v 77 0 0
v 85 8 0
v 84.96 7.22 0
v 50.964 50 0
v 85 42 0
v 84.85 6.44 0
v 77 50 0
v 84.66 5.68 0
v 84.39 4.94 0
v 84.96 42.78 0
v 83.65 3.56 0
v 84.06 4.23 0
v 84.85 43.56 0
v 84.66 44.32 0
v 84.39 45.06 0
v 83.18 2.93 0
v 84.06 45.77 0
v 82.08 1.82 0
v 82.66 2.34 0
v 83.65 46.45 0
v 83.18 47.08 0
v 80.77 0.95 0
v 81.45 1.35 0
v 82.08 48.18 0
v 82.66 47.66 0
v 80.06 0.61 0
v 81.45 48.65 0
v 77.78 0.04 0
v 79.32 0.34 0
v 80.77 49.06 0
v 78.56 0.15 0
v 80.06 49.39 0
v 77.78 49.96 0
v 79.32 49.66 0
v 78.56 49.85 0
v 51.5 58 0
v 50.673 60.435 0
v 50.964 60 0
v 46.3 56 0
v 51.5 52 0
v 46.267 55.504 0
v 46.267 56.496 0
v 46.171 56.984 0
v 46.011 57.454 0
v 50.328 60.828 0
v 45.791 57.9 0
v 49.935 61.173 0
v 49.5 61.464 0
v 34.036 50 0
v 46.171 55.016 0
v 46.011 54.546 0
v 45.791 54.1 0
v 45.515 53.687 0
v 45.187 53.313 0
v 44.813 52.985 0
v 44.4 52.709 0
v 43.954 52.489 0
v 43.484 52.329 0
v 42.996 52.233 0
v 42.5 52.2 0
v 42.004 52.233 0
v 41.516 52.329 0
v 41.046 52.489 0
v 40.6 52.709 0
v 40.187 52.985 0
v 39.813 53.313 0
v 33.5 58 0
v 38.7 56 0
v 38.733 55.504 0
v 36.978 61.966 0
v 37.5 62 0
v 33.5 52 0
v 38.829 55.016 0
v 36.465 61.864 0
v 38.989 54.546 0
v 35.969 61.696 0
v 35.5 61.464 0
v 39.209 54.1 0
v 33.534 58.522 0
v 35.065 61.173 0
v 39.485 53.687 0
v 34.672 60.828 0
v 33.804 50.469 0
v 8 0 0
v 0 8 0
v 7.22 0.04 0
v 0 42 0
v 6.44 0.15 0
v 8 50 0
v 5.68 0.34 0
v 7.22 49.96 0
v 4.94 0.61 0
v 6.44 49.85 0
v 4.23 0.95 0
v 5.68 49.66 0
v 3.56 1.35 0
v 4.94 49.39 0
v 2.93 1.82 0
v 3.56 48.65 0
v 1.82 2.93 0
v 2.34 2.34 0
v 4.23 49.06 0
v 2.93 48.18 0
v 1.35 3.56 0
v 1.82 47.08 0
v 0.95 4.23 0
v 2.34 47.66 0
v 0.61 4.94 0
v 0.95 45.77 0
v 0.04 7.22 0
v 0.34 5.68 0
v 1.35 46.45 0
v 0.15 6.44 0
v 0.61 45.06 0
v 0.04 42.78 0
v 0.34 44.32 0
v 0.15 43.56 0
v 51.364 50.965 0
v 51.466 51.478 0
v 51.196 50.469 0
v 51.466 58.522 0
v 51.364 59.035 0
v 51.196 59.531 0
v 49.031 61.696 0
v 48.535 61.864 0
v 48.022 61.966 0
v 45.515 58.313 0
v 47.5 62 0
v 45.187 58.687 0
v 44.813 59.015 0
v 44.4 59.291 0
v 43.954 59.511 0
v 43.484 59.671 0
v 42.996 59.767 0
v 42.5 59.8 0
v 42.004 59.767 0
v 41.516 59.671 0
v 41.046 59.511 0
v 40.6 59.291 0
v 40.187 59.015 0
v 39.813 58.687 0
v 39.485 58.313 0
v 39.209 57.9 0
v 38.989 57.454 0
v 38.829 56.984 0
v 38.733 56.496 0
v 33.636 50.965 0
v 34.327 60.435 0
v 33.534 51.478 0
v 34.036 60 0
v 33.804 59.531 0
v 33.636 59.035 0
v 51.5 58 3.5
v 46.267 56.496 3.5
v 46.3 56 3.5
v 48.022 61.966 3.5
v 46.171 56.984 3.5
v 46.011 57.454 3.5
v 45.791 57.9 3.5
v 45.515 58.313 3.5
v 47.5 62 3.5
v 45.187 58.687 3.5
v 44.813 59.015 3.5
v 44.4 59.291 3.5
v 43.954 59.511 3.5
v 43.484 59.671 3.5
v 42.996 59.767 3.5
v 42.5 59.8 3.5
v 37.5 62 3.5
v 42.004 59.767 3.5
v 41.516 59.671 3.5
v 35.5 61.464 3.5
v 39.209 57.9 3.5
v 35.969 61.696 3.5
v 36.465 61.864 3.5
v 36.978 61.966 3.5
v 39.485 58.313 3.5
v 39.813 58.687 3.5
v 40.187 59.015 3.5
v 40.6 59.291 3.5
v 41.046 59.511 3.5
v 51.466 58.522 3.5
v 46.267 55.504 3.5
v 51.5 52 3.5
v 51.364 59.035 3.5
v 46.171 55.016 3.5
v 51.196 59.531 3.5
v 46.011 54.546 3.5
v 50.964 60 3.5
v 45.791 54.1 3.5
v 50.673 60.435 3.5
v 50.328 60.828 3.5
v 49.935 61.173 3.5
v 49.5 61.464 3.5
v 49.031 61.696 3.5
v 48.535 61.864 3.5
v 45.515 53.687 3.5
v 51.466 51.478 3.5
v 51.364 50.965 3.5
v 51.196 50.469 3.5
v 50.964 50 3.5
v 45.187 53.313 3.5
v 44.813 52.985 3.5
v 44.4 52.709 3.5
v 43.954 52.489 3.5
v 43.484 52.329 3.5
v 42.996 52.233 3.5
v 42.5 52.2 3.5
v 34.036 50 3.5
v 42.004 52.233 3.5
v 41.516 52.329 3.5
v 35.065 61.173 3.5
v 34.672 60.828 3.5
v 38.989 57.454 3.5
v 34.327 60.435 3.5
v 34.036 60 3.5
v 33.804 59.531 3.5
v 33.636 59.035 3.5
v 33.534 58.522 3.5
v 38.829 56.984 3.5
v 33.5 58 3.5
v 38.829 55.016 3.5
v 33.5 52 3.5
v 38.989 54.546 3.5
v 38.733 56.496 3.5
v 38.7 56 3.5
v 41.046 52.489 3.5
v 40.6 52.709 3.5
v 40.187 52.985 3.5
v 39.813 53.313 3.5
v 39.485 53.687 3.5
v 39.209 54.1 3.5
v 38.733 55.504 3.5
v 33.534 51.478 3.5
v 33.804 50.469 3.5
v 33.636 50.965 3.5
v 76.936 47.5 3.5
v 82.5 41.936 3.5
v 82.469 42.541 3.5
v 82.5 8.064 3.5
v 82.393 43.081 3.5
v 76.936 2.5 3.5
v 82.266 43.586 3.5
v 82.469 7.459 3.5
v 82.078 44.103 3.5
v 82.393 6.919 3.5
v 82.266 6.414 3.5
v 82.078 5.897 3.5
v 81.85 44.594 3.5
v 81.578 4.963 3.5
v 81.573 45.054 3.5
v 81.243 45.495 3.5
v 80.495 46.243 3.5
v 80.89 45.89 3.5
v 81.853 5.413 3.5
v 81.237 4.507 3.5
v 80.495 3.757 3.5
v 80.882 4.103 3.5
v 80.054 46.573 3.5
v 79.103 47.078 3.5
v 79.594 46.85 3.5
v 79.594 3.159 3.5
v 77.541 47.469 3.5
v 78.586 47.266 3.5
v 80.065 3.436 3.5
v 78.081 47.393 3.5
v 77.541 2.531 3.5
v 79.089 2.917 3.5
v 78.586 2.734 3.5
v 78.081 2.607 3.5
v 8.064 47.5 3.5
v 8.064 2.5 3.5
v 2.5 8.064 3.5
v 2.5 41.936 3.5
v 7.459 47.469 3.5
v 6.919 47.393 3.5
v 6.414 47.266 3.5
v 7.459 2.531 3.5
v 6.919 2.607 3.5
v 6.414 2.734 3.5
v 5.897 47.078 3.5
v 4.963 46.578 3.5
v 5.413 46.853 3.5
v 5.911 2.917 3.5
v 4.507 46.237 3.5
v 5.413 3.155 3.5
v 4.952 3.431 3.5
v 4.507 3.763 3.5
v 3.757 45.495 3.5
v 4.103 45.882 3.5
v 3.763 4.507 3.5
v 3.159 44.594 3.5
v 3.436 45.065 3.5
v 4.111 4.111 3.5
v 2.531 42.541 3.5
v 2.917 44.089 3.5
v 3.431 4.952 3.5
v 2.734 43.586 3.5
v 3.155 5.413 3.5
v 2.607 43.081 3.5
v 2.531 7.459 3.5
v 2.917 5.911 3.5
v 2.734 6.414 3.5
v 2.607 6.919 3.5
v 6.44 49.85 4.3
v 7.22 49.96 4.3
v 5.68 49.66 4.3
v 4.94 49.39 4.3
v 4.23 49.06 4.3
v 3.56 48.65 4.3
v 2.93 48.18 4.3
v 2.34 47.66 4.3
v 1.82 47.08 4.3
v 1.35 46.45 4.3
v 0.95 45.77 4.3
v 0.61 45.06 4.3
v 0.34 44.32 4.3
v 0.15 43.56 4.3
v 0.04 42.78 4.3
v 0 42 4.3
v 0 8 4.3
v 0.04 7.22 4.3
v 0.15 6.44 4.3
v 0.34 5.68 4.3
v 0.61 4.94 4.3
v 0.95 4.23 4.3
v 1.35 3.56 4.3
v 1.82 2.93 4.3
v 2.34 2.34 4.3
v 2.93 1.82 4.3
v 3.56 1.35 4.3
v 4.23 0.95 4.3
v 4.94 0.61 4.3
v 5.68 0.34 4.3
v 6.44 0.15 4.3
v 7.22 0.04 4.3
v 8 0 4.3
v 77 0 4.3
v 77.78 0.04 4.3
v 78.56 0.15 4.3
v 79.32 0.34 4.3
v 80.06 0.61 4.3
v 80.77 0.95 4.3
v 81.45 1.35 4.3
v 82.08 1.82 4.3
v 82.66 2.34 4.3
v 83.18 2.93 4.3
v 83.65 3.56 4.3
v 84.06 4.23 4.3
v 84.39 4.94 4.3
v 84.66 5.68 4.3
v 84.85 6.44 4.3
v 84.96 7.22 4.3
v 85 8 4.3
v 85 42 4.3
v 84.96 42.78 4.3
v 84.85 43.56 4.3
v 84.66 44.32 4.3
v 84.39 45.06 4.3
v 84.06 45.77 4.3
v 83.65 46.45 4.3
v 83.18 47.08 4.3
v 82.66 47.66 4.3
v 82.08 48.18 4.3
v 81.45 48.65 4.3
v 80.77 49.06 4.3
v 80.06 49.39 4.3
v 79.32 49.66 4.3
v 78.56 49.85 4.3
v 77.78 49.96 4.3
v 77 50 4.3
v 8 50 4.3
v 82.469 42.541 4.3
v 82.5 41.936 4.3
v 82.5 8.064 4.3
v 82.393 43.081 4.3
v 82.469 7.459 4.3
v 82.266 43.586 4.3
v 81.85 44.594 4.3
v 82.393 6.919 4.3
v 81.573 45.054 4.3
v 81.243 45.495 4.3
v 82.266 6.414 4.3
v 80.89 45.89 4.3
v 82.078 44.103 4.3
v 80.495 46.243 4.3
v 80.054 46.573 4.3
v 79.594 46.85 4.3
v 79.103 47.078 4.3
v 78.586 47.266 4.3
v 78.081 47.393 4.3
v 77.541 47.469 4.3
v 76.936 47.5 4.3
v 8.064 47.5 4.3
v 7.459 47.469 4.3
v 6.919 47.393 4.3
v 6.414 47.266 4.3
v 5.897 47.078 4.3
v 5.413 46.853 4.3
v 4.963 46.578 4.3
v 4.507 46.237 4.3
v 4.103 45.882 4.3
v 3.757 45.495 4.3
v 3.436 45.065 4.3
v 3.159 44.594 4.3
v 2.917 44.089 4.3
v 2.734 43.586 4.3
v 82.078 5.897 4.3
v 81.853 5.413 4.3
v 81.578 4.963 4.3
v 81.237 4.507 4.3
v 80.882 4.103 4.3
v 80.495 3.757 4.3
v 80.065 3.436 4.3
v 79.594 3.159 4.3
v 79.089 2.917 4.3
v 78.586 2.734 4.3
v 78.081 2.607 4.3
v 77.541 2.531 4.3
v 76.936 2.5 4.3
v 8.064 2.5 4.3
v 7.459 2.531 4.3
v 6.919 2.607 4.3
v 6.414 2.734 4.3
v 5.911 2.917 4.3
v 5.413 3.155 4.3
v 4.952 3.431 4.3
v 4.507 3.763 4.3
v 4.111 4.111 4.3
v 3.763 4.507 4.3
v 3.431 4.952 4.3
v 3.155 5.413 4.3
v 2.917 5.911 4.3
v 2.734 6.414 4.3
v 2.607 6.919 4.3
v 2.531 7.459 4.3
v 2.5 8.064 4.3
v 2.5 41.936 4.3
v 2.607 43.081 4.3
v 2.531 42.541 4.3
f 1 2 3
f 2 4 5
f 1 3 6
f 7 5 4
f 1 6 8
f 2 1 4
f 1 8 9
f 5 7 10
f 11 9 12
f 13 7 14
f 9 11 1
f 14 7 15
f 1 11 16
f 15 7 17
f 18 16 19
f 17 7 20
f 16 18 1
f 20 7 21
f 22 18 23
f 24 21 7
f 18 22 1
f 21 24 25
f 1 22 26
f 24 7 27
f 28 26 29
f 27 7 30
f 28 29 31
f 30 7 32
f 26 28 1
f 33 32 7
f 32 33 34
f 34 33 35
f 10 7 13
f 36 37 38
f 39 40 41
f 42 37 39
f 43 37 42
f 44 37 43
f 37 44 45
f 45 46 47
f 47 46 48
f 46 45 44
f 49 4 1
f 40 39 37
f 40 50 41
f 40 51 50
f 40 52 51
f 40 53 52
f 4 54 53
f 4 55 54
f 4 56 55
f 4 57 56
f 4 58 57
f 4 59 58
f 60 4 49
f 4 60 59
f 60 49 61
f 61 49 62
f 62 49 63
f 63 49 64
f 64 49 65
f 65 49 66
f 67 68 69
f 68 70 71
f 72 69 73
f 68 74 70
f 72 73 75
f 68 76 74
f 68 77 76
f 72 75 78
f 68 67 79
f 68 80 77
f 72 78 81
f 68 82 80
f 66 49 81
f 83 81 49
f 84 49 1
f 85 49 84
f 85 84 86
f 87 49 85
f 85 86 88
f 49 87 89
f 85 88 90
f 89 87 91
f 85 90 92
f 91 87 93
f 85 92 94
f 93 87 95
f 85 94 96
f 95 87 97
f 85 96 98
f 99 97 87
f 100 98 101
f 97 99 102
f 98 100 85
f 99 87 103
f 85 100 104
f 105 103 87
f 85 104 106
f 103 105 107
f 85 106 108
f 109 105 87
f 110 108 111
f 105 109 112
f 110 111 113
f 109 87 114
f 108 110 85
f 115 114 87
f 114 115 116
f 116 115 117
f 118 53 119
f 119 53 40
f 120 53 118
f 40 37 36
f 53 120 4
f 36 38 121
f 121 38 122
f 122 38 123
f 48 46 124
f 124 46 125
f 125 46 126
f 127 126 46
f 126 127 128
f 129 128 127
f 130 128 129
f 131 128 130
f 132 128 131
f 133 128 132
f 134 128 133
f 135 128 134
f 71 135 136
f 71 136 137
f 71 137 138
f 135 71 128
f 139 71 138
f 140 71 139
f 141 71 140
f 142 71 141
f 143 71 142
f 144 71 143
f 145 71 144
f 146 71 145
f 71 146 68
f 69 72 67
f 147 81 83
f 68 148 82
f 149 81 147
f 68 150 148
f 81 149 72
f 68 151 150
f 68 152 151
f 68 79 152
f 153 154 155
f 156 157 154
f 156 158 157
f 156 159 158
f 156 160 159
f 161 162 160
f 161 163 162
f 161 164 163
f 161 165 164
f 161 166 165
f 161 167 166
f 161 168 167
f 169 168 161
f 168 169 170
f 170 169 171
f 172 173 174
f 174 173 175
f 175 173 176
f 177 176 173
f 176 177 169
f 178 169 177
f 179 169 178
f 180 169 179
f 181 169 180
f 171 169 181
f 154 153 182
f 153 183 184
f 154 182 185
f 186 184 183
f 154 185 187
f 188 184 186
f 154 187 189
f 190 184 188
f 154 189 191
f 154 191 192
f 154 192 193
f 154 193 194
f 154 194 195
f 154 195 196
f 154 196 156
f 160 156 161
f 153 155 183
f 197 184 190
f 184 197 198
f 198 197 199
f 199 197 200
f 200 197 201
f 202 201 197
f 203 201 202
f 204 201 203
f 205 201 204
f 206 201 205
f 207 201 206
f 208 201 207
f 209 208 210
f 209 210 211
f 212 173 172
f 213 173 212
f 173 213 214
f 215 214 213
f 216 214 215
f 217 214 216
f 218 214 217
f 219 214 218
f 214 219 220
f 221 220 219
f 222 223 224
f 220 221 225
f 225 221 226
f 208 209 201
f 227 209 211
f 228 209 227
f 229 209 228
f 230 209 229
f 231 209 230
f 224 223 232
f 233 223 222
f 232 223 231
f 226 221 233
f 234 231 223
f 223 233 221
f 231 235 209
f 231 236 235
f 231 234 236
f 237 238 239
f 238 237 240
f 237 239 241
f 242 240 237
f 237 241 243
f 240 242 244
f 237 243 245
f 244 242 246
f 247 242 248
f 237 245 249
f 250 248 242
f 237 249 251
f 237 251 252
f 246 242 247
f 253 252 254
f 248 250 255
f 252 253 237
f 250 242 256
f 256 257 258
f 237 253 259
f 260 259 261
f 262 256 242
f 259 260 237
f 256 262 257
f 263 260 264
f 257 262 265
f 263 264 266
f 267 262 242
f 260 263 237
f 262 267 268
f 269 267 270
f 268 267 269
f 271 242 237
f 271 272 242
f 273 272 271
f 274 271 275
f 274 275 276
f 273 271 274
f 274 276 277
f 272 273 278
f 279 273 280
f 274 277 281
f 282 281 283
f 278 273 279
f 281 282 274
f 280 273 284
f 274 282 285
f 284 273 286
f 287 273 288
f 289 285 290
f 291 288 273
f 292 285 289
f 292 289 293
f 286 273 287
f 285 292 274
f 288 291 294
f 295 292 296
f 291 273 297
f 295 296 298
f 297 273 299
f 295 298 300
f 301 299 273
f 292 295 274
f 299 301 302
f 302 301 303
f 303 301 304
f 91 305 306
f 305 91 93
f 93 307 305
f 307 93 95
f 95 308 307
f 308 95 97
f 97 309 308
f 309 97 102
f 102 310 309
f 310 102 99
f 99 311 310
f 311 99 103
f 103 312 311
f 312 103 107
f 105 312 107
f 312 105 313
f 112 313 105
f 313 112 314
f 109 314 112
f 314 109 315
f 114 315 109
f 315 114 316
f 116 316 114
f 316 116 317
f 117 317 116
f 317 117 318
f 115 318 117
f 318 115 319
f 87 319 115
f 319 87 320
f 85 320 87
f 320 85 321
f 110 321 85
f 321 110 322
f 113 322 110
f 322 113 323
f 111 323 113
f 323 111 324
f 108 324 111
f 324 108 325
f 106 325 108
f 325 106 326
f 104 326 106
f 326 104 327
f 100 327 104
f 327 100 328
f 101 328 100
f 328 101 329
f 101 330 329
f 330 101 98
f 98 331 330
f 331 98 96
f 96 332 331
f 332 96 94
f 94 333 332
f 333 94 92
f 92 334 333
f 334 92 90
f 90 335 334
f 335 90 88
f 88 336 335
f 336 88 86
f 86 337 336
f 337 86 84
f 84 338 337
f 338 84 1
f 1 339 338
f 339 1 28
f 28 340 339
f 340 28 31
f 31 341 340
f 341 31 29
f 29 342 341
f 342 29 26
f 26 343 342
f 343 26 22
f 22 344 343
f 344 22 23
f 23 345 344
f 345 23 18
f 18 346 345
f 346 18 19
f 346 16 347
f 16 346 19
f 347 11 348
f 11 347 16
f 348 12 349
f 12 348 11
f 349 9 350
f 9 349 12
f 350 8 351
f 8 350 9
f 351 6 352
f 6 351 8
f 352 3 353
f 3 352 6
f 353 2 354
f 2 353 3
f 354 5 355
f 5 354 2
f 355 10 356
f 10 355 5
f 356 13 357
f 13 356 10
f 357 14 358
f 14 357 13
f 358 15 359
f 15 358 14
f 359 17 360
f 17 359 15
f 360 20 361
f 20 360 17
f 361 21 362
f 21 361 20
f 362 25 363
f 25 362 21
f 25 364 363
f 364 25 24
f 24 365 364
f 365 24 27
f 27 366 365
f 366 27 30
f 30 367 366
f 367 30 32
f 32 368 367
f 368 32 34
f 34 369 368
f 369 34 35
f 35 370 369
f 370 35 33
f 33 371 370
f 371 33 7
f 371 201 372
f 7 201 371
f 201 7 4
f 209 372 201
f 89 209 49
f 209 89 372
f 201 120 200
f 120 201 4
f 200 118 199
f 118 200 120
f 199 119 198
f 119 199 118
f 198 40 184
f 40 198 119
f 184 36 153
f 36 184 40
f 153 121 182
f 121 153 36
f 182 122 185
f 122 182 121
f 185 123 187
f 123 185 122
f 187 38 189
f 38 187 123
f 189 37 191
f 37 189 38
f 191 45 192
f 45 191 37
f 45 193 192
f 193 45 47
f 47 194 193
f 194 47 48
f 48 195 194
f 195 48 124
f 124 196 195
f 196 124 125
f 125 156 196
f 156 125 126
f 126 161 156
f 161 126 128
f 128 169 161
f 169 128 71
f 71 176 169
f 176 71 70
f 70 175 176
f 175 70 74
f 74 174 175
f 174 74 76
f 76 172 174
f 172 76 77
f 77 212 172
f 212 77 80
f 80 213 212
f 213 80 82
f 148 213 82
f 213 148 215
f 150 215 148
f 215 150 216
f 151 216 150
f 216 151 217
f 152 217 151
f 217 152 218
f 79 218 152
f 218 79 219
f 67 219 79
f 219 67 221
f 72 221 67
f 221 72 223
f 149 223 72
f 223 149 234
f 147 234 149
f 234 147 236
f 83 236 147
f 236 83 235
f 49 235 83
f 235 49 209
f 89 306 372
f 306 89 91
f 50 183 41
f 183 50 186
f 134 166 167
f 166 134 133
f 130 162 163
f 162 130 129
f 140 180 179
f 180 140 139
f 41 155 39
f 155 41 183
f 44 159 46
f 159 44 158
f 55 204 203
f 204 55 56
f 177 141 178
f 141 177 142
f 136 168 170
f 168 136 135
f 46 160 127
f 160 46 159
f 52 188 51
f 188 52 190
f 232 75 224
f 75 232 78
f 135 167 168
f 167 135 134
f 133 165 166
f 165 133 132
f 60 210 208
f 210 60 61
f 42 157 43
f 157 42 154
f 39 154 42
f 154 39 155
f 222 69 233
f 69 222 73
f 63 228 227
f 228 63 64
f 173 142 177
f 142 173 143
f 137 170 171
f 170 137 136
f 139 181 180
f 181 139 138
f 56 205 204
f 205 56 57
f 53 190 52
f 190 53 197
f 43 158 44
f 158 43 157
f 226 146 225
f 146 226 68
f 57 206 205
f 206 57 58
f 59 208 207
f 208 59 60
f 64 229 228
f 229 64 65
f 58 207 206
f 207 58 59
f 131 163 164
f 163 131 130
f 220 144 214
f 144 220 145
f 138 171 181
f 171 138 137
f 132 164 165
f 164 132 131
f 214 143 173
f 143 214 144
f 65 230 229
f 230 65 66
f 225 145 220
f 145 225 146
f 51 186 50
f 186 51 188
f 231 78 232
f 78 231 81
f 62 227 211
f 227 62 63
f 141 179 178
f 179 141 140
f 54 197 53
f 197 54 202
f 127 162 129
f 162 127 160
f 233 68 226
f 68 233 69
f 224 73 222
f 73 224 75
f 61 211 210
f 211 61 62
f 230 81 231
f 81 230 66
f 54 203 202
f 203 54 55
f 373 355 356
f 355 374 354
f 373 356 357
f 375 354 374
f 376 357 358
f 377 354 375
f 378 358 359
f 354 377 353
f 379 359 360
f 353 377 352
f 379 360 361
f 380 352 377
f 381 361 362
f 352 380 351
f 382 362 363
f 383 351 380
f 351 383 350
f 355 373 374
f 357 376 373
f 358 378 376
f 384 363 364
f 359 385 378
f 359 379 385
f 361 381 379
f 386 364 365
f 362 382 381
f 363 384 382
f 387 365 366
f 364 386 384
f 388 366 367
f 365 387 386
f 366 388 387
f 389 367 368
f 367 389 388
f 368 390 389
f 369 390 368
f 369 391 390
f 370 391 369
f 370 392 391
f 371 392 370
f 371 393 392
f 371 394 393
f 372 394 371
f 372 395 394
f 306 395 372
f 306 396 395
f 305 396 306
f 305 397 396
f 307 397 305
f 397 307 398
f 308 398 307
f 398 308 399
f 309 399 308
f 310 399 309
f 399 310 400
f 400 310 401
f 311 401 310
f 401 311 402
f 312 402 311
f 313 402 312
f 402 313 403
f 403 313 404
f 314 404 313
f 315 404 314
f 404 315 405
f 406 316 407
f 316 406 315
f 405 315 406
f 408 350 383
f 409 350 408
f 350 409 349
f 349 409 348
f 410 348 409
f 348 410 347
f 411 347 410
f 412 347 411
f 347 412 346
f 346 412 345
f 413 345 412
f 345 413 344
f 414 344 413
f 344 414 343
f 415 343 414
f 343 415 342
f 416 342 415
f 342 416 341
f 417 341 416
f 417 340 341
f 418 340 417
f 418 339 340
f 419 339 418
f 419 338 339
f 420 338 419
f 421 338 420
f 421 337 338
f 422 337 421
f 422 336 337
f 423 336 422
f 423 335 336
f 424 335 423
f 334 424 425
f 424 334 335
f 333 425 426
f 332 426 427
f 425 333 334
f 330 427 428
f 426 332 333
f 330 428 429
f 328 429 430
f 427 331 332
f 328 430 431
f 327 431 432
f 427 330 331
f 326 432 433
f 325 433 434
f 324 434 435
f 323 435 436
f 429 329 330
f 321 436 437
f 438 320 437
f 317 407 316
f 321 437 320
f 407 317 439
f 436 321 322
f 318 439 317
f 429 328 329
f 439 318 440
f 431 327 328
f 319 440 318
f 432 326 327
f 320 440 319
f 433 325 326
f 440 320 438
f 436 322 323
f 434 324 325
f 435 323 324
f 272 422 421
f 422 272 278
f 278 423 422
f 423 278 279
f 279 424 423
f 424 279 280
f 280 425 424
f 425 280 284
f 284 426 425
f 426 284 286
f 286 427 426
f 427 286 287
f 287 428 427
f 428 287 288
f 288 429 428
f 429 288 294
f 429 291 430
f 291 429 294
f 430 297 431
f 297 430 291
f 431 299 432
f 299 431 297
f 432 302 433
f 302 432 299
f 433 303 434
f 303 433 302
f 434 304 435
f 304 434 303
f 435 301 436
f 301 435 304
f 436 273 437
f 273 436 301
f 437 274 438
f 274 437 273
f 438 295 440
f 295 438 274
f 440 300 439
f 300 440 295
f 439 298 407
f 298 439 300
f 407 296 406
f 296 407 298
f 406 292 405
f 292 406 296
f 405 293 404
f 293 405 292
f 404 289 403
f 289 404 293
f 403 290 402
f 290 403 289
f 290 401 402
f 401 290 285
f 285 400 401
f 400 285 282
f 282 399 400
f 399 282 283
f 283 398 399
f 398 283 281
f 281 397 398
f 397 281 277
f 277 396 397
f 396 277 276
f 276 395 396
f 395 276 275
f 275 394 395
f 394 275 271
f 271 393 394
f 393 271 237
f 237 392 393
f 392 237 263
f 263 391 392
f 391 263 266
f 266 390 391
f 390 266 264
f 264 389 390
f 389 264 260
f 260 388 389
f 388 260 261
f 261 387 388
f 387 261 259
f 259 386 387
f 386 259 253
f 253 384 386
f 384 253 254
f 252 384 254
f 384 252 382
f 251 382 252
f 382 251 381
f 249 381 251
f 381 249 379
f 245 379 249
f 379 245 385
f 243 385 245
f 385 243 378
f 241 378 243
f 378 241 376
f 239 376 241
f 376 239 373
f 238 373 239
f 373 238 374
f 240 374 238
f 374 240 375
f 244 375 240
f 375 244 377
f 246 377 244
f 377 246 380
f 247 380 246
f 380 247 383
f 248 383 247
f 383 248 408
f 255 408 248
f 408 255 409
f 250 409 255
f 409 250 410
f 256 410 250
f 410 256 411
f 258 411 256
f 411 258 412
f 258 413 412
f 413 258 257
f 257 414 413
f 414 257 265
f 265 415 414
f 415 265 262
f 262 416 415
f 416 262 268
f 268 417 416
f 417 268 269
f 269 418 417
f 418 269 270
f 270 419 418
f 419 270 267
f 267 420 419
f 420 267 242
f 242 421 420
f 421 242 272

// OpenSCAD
// ── ETIQUETA PARA MOCHILA / SACO DE DESPORTO ──
// Parâmetros injectados pelo backend:
//   nome, linha2, verso   texto da frente (1–2 linhas) e do verso (escavado)
//   fonte                 família da fonte (instalada no servidor, ver /fonts)
//   fontSize              tamanho do texto em mm (size do OpenSCAD)
//   largura_pct, altura_pct  largura / altura da placa em % da forma (50–200, omissão 100)
//   esc_nome, esc_linha2, esc_verso
//                         factor 0–1 de redução do texto, calculado pelo servidor
//                         (lib/textFit.js) para caber na largura útil; 1 = sem redução
//   cor_base, cor_borda, cor_texto
//                         cores (#RRGGBB) de cada parte; só usadas no modo "tudo"
//                         (no 3MF a cor vai em cada objeto, ver generation_schema.multicor)
//   modo                  que parte gerar: "base" (placa + aba, com o verso escavado),
//                         "borda", "texto" ou "tudo" (omissão; "preview" = "tudo").
//                         O backend gera cada parte num STL e junta-as num 3MF multicor.
//                         As partes tocam-se sem se sobreporem, para o slicer as aceitar
//                         como peças do mesmo objeto.
//
// Não há valores por defeito como `nome = ...;` e também não se derivam variáveis de
// topo a partir das injectadas (`_nome = is_undef(nome) ? "" : nome;` seria calculada
// antes de o servidor definir `nome` quando as variáveis vêm DEPOIS do template, e sairia
// vazia — a etiqueta ficava sem texto).
// As injectadas são lidas por funções, avaliadas só na instanciação, quando já têm o
// valor final — por isso a ordem de injecção (antes ou depois do template) é indiferente.

function _nome()      = is_undef(nome)      ? ""          : nome;
function _linha2()    = is_undef(linha2)    ? ""          : linha2;
function _verso()     = is_undef(verso)     ? ""          : verso;
function _fonte()     = is_undef(fonte)     ? "Open Sans" : fonte;
function _fs()        = is_undef(fontSize)  ? 9           : fontSize;
function _esc_nome()   = is_undef(esc_nome)   ? 1 : esc_nome;
function _esc_linha2() = is_undef(esc_linha2) ? 1 : esc_linha2;
function _esc_verso()  = is_undef(esc_verso)  ? 1 : esc_verso;
function _modo()      = is_undef(modo) ? "tudo" : modo;
function _cor(c, d)   = (is_string(c) && len(c) == 7) ? c : d;
function _cor_base()  = is_undef(cor_base)  ? "#1E3A8A" : _cor(cor_base,  "#1E3A8A");
function _cor_borda() = is_undef(cor_borda) ? "#FFFFFF" : _cor(cor_borda, "#FFFFFF");
function _cor_texto() = is_undef(cor_texto) ? "#FFFFFF" : _cor(cor_texto, "#FFFFFF");
// Peças separadas (base/borda/texto) assentam em z = esp; em "tudo" sobrepõem-se 0,01 mm
// para o OpenSCAD as fundir num só sólido.
function _sob()       = (_modo() == "base" || _modo() == "borda" || _modo() == "texto") ? 0 : 0.01;

esp     = 3.5;
r_furo  = 3.8;

// Borda e texto
borda_larg = 2.5;
borda_esp  = 0.8;
alt_texto  = 1.2;   // relevo da frente
prof_verso = 1.3;   // profundidade do verso escavado

// FORMAS: contornos pré-calculados (scripts/gerar_formas.mjs); a pré-visualização do
// browser usa os mesmos pontos. A largura útil do texto de cada forma está em
// generation_schema.ajuste_texto.largura_por_forma (usada pelo servidor e pelo browser).
// @@FORMAS-BEGIN (gerado por scripts/gerar_formas.mjs — não editar à mão)
// [nome, cx, cy, topo_em_cx, largura_base, altura_base, aba_w, aba_r, aba_recuo, furo_acima_topo, aba_acima_furo, contorno]
// (largura_pct/altura_pct escalam x e y; a borda é calculada no OpenSCAD com offset)
FORMAS = [
  ["Retangular", 42.5, 25, 50, 85, 50, 18, 4, 2, 6, 6,
   [[77.78,0.04],[78.56,0.15],[79.32,0.34],[80.06,0.61],[80.77,0.95],[81.45,1.35],[82.08,1.82],[82.66,2.34],[83.18,2.93],[83.65,3.56],[84.06,4.23],[84.39,4.94],[84.66,5.68],[84.85,6.44],[84.96,7.22],[85,8],[85,42],[84.96,42.78],[84.85,43.56],[84.66,44.32],[84.39,45.06],[84.06,45.77],[83.65,46.45],[83.18,47.08],[82.66,47.66],[82.08,48.18],[81.45,48.65],[80.77,49.06],[80.06,49.39],[79.32,49.66],[78.56,49.85],[77.78,49.96],[77,50],[8,50],[7.22,49.96],[6.44,49.85],[5.68,49.66],[4.94,49.39],[4.23,49.06],[3.56,48.65],[2.93,48.18],[2.34,47.66],[1.82,47.08],[1.35,46.45],[0.95,45.77],[0.61,45.06],[0.34,44.32],[0.15,43.56],[0.04,42.78],[0,42],[0,8],[0.04,7.22],[0.15,6.44],[0.34,5.68],[0.61,4.94],[0.95,4.23],[1.35,3.56],[1.82,2.93],[2.34,2.34],[2.93,1.82],[3.56,1.35],[4.23,0.95],[4.94,0.61],[5.68,0.34],[6.44,0.15],[7.22,0.04],[8,0],[77,0]]],
  ["Redonda", 32, 32, 64, 64, 64, 18, 4, 10, 6, 6,
   [[33.57,0.04],[35.14,0.15],[36.7,0.35],[38.24,0.62],[39.78,0.96],[41.29,1.38],[42.78,1.87],[44.25,2.44],[45.68,3.07],[47.09,3.78],[48.45,4.55],[49.78,5.39],[51.06,6.3],[52.3,7.26],[53.49,8.29],[54.63,9.37],[55.71,10.51],[56.74,11.7],[57.7,12.94],[58.61,14.22],[59.45,15.55],[60.22,16.92],[60.93,18.32],[61.56,19.75],[62.13,21.22],[62.62,22.71],[63.04,24.23],[63.39,25.76],[63.65,27.31],[63.85,28.86],[63.96,30.43],[64,32],[63.96,33.57],[63.85,35.14],[63.65,36.7],[63.39,38.24],[63.04,39.78],[62.62,41.29],[62.13,42.78],[61.56,44.25],[60.93,45.68],[60.22,47.09],[59.45,48.45],[58.61,49.78],[57.7,51.06],[56.74,52.3],[55.71,53.49],[54.63,54.63],[53.49,55.71],[52.3,56.74],[51.06,57.7],[49.78,58.61],[48.45,59.45],[47.09,60.22],[45.68,60.93],[44.25,61.56],[42.78,62.13],[41.29,62.62],[39.78,63.04],[38.24,63.39],[36.7,63.65],[35.14,63.85],[33.57,63.96],[32,64],[30.43,63.96],[28.86,63.85],[27.31,63.65],[25.76,63.39],[24.23,63.04],[22.71,62.62],[21.22,62.13],[19.75,61.56],[18.32,60.93],[16.92,60.22],[15.55,59.45],[14.22,58.61],[12.94,57.7],[11.7,56.74],[10.51,55.71],[9.37,54.63],[8.29,53.49],[7.26,52.3],[6.3,51.06],[5.39,49.78],[4.55,48.45],[3.78,47.09],[3.07,45.68],[2.44,44.25],[1.87,42.78],[1.38,41.29],[0.96,39.78],[0.62,38.24],[0.35,36.7],[0.15,35.14],[0.04,33.57],[0,32],[0.04,30.43],[0.15,28.86],[0.35,27.31],[0.62,25.76],[0.96,24.23],[1.38,22.71],[1.87,21.22],[2.44,19.75],[3.07,18.32],[3.78,16.92],[4.55,15.55],[5.39,14.22],[6.3,12.94],[7.26,11.7],[8.29,10.51],[9.37,9.37],[10.51,8.29],[11.7,7.26],[12.94,6.3],[14.22,5.39],[15.55,4.55],[16.92,3.78],[18.32,3.07],[19.75,2.44],[21.22,1.87],[22.71,1.38],[24.23,0.96],[25.76,0.62],[27.31,0.35],[28.86,0.15],[30.43,0.04],[32,0]]],
  ["Nuvem", 42.5, 22, 50, 85, 50, 18, 4, 19, 6, 6,
   [[74.18,0.06],[75.34,0.23],[76.48,0.52],[77.59,0.91],[78.66,1.42],[79.67,2.02],[80.61,2.72],[81.49,3.52],[82.28,4.39],[82.98,5.33],[83.58,6.34],[84.09,7.41],[84.48,8.52],[84.77,9.66],[84.94,10.82],[85,12],[84.94,13.18],[84.77,14.34],[84.48,15.48],[84.09,16.59],[83.58,17.66],[82.98,18.67],[82.28,19.61],[81.49,20.49],[80.61,21.28],[79.67,21.98],[79.22,22.25],[79.49,23.12],[79.77,24.4],[79.94,25.69],[80,27],[79.94,28.31],[79.77,29.61],[79.49,30.88],[79.1,32.13],[78.6,33.34],[77.99,34.5],[77.29,35.6],[76.49,36.64],[75.61,37.61],[74.64,38.49],[73.6,39.29],[72.5,39.99],[71.34,40.6],[70.13,41.1],[68.88,41.49],[67.61,41.77],[66.31,41.94],[65,42],[63.69,41.94],[62.4,41.77],[61.12,41.49],[59.87,41.1],[58.66,40.6],[58.38,40.45],[58.09,41],[57.25,42.32],[56.29,43.57],[55.23,44.73],[54.07,45.79],[52.82,46.75],[51.5,47.59],[50.11,48.31],[48.66,48.91],[47.16,49.39],[45.63,49.73],[44.07,49.93],[42.5,50],[40.93,49.93],[39.37,49.73],[37.84,49.39],[36.34,48.91],[34.89,48.31],[33.5,47.59],[32.18,46.75],[30.93,45.79],[29.77,44.73],[28.71,43.57],[27.76,42.32],[27,41.14],[25.88,41.49],[24.61,41.77],[23.31,41.94],[22,42],[20.69,41.94],[19.4,41.77],[18.12,41.49],[16.87,41.1],[15.66,40.6],[14.5,39.99],[13.4,39.29],[12.36,38.49],[11.39,37.61],[10.51,36.64],[9.71,35.6],[9.01,34.5],[8.41,33.34],[7.91,32.13],[7.51,30.88],[7.23,29.61],[7.06,28.31],[7,27],[7.06,25.69],[7.23,24.4],[7.51,23.12],[7.41,23.09],[6.34,22.58],[5.33,21.98],[4.39,21.28],[3.52,20.49],[2.72,19.61],[2.02,18.67],[1.42,17.66],[0.91,16.59],[0.52,15.48],[0.23,14.34],[0.06,13.18],[0,12],[0.06,10.82],[0.23,9.66],[0.52,8.52],[0.91,7.41],[1.42,6.34],[2.02,5.33],[2.72,4.39],[3.52,3.52],[4.39,2.72],[5.33,2.02],[6.34,1.42],[7.41,0.91],[8.52,0.52],[9.66,0.23],[10.82,0.06],[12,0],[73,0]]],
  ["Mochila", 42.5, 24, 50, 83, 50, 18, 4, 4, 6, 6,
   [[64.88,0.04],[65.76,0.17],[66.61,0.39],[67.44,0.69],[68.24,1.06],[69,1.52],[69.71,2.04],[70.36,2.64],[70.96,3.29],[71.48,4],[71.54,4.1],[71.67,4.01],[72.17,3.71],[72.7,3.46],[73.26,3.26],[73.83,3.12],[74.41,3.03],[75,3],[78,3],[78.59,3.03],[79.17,3.12],[79.74,3.26],[80.3,3.46],[80.83,3.71],[81.33,4.01],[81.81,4.36],[82.24,4.76],[82.64,5.19],[82.99,5.67],[83.29,6.17],[83.54,6.7],[83.74,7.26],[83.89,7.83],[83.97,8.41],[84,9],[84,21],[83.97,21.59],[83.89,22.17],[83.74,22.74],[83.54,23.3],[83.29,23.83],[82.99,24.33],[82.64,24.81],[82.24,25.24],[81.81,25.64],[81.33,25.99],[80.83,26.29],[80.3,26.54],[79.74,26.74],[79.17,26.89],[78.59,26.97],[78,27],[75,27],[74.41,26.97],[73.83,26.89],[73.26,26.74],[72.7,26.54],[72.41,26.41],[72.64,27.29],[72.91,29.14],[73,31],[72.91,32.86],[72.64,34.71],[72.18,36.52],[71.55,38.27],[70.76,39.96],[69.8,41.56],[68.69,43.05],[67.44,44.44],[66.05,45.69],[64.56,46.8],[62.96,47.76],[61.27,48.55],[59.52,49.18],[57.71,49.64],[55.86,49.91],[54,50],[31,50],[29.14,49.91],[27.29,49.64],[25.49,49.18],[23.73,48.55],[22.04,47.76],[20.44,46.8],[18.95,45.69],[17.57,44.44],[16.31,43.05],[15.2,41.56],[14.24,39.96],[13.45,38.27],[12.82,36.52],[12.37,34.71],[12.09,32.86],[12,31],[12.09,29.14],[12.37,27.29],[12.59,26.41],[12.3,26.54],[11.74,26.74],[11.17,26.89],[10.59,26.97],[10,27],[7,27],[6.41,26.97],[5.83,26.89],[5.26,26.74],[4.7,26.54],[4.17,26.29],[3.67,25.99],[3.19,25.64],[2.76,25.24],[2.36,24.81],[2.01,24.33],[1.71,23.83],[1.46,23.3],[1.26,22.74],[1.12,22.17],[1.03,21.59],[1,21],[1,9],[1.03,8.41],[1.12,7.83],[1.26,7.26],[1.46,6.7],[1.71,6.17],[2.01,5.67],[2.36,5.19],[2.76,4.76],[3.19,4.36],[3.67,4.01],[4.17,3.71],[4.7,3.46],[5.26,3.26],[5.83,3.12],[6.41,3.03],[7,3],[10,3],[10.59,3.03],[11.17,3.12],[11.74,3.26],[12.3,3.46],[12.83,3.71],[13.33,4.01],[13.46,4.1],[13.52,4],[14.04,3.29],[14.64,2.64],[15.29,2.04],[16,1.52],[16.76,1.06],[17.56,0.69],[18.39,0.39],[19.24,0.17],[20.12,0.04],[21,0],[64,0]]],
  ["Flor", 31, 31, 62, 62, 62, 14, 4, 13, 6, 6,
   [[32.08,0.05],[33.15,0.21],[34.19,0.47],[35.21,0.84],[36.19,1.3],[37.11,1.85],[37.98,2.5],[38.78,3.22],[39.5,4.02],[40.15,4.89],[40.7,5.82],[41.09,6.64],[41.95,6.33],[43,6.07],[44.06,5.91],[45.14,5.86],[46.22,5.91],[47.29,6.07],[48.34,6.33],[49.35,6.7],[50.33,7.16],[51.25,7.71],[52.12,8.36],[52.92,9.08],[53.65,9.88],[54.29,10.75],[54.84,11.67],[55.31,12.65],[55.67,13.67],[55.93,14.71],[56.09,15.78],[56.14,16.86],[56.09,17.94],[55.93,19],[55.67,20.05],[55.36,20.91],[56.19,21.3],[57.11,21.85],[57.98,22.5],[58.78,23.22],[59.5,24.02],[60.15,24.89],[60.7,25.82],[61.16,26.79],[61.53,27.81],[61.79,28.85],[61.95,29.92],[62,31],[61.95,32.08],[61.79,33.15],[61.53,34.19],[61.16,35.21],[60.7,36.19],[60.15,37.11],[59.5,37.98],[58.78,38.78],[57.98,39.5],[57.11,40.15],[56.19,40.7],[55.36,41.09],[55.67,41.95],[55.93,43],[56.09,44.06],[56.14,45.14],[56.09,46.22],[55.93,47.29],[55.67,48.34],[55.31,49.35],[54.84,50.33],[54.29,51.25],[53.65,52.12],[52.92,52.92],[52.12,53.65],[51.25,54.29],[50.33,54.84],[49.35,55.31],[48.34,55.67],[47.29,55.93],[46.22,56.09],[45.14,56.14],[44.06,56.09],[43,55.93],[41.95,55.67],[41.09,55.36],[40.7,56.19],[40.15,57.11],[39.5,57.98],[38.78,58.78],[37.98,59.5],[37.11,60.15],[36.19,60.7],[35.21,61.16],[34.19,61.53],[33.15,61.79],[32.08,61.95],[31,62],[29.92,61.95],[28.85,61.79],[27.81,61.53],[26.79,61.16],[25.82,60.7],[24.89,60.15],[24.02,59.5],[23.22,58.78],[22.5,57.98],[21.85,57.11],[21.3,56.19],[20.91,55.36],[20.05,55.67],[19,55.93],[17.94,56.09],[16.86,56.14],[15.78,56.09],[14.71,55.93],[13.67,55.67],[12.65,55.31],[11.67,54.84],[10.75,54.29],[9.88,53.65],[9.08,52.92],[8.36,52.12],[7.71,51.25],[7.16,50.33],[6.7,49.35],[6.33,48.34],[6.07,47.29],[5.91,46.22],[5.86,45.14],[5.91,44.06],[6.07,43],[6.33,41.95],[6.64,41.09],[5.82,40.7],[4.89,40.15],[4.02,39.5],[3.22,38.78],[2.5,37.98],[1.85,37.11],[1.3,36.19],[0.84,35.21],[0.47,34.19],[0.21,33.15],[0.05,32.08],[0,31],[0.05,29.92],[0.21,28.85],[0.47,27.81],[0.84,26.79],[1.3,25.82],[1.85,24.89],[2.5,24.02],[3.22,23.22],[4.02,22.5],[4.89,21.85],[5.82,21.3],[6.64,20.91],[6.33,20.05],[6.07,19],[5.91,17.94],[5.86,16.86],[5.91,15.78],[6.07,14.71],[6.33,13.67],[6.7,12.65],[7.16,11.67],[7.71,10.75],[8.36,9.88],[9.08,9.08],[9.88,8.36],[10.75,7.71],[11.67,7.16],[12.65,6.7],[13.67,6.33],[14.71,6.07],[15.78,5.91],[16.86,5.86],[17.94,5.91],[19,6.07],[20.05,6.33],[20.91,6.64],[21.3,5.82],[21.85,4.89],[22.5,4.02],[23.22,3.22],[24.02,2.5],[24.89,1.85],[25.82,1.3],[26.79,0.84],[27.81,0.47],[28.85,0.21],[29.92,0.05],[31,0]]],
  ["Sol", 36, 36, 60, 69.54, 69.54, 14, 4, 8, 6, 6,
   [[45.23,13.85],[46.62,14.48],[48,15.22],[49.33,16.05],[50.57,16.93],[61.46,10.54],[55.07,21.43],[55.96,22.67],[56.79,24],[57.53,25.39],[58.15,26.77],[70.77,26.68],[59.8,32.92],[59.95,34.43],[60,36],[59.95,37.57],[59.8,39.08],[70.77,45.32],[58.15,45.23],[57.53,46.62],[56.79,48],[55.96,49.33],[55.07,50.57],[61.46,61.46],[50.57,55.07],[49.33,55.96],[48,56.79],[46.62,57.53],[45.23,58.15],[45.32,70.77],[39.08,59.8],[37.57,59.95],[36,60],[34.43,59.95],[32.92,59.8],[26.68,70.77],[26.77,58.15],[25.39,57.53],[24,56.79],[22.67,55.96],[21.43,55.07],[10.54,61.46],[16.93,50.57],[16.05,49.33],[15.22,48],[14.48,46.62],[13.85,45.23],[1.23,45.32],[12.2,39.08],[12.05,37.57],[12,36],[12.05,34.43],[12.2,32.92],[1.23,26.68],[13.85,26.77],[14.48,25.39],[15.22,24],[16.05,22.67],[16.93,21.43],[10.54,10.54],[21.43,16.93],[22.67,16.05],[24,15.22],[25.39,14.48],[26.77,13.85],[26.68,1.23],[32.92,12.2],[34.43,12.05],[36,12],[37.57,12.05],[39.08,12.2],[45.32,1.23]]],
  ["Estrela", 34, 34, 68, 64.68, 61.51, 16, 8, 4, 4, 8,
   [[50.17,28.75],[66.34,44.51],[43.99,47.75],[34,68],[24.01,47.75],[1.66,44.51],[17.83,28.75],[14.02,6.49],[34,17],[53.99,6.49]]],
  ["Livro", 42.5, 25, 47.59, 85, 50, 18, 4, 6, 6, 6,
   [[36.98,0.05],[37.95,0.19],[38.9,0.43],[39.83,0.76],[40.71,1.18],[41.56,1.69],[42.34,2.27],[42.5,2.41],[42.66,2.27],[43.44,1.69],[44.29,1.18],[45.17,0.76],[46.1,0.43],[47.05,0.19],[48.02,0.05],[49,0],[75,0],[75.98,0.05],[76.95,0.19],[77.9,0.43],[78.83,0.76],[79.71,1.18],[80.56,1.69],[81.34,2.27],[82.07,2.93],[82.73,3.66],[83.32,4.44],[83.82,5.29],[84.24,6.17],[84.57,7.1],[84.81,8.05],[84.95,9.02],[85,10],[85,40],[84.95,40.98],[84.81,41.95],[84.57,42.9],[84.24,43.83],[83.82,44.71],[83.32,45.56],[82.73,46.34],[82.07,47.07],[81.34,47.73],[80.56,48.32],[79.71,48.82],[78.83,49.24],[77.9,49.57],[76.95,49.81],[75.98,49.95],[75,50],[49,50],[48.02,49.95],[47.05,49.81],[46.1,49.57],[45.17,49.24],[44.29,48.82],[43.44,48.32],[42.66,47.73],[42.5,47.59],[42.34,47.73],[41.56,48.32],[40.71,48.82],[39.83,49.24],[38.9,49.57],[37.95,49.81],[36.98,49.95],[36,50],[10,50],[9.02,49.95],[8.05,49.81],[7.1,49.57],[6.17,49.24],[5.29,48.82],[4.44,48.32],[3.66,47.73],[2.93,47.07],[2.27,46.34],[1.69,45.56],[1.18,44.71],[0.76,43.83],[0.43,42.9],[0.19,41.95],[0.05,40.98],[0,40],[0,10],[0.05,9.02],[0.19,8.05],[0.43,7.1],[0.76,6.17],[1.18,5.29],[1.69,4.44],[2.27,3.66],[2.93,2.93],[3.66,2.27],[4.44,1.69],[5.29,1.18],[6.17,0.76],[7.1,0.43],[8.05,0.19],[9.02,0.05],[10,0],[36,0]]],
  ["Lápis", 52, 19, 38, 85, 38, 18, 4, 2, 6, 6,
   [[79.59,0.03],[80.17,0.12],[80.74,0.26],[81.3,0.46],[81.83,0.71],[82.33,1.01],[82.81,1.36],[83.24,1.76],[83.64,2.19],[83.99,2.67],[84.29,3.17],[84.54,3.7],[84.74,4.26],[84.89,4.83],[84.97,5.41],[85,6],[85,32],[84.97,32.59],[84.89,33.17],[84.74,33.74],[84.54,34.3],[84.29,34.83],[83.99,35.33],[83.64,35.81],[83.24,36.24],[82.81,36.64],[82.33,36.99],[81.83,37.29],[81.3,37.54],[80.74,37.74],[80.17,37.89],[79.59,37.97],[79,38],[20,38],[19.41,37.97],[18.83,37.89],[18.26,37.74],[17.7,37.54],[17.17,37.29],[16.67,36.99],[16.19,36.64],[15.76,36.24],[15.36,35.81],[15.01,35.33],[14.71,34.83],[14.46,34.3],[14.26,33.74],[14.12,33.17],[14.03,32.59],[14,32],[14,30.2],[0,19],[14,7.8],[14,6],[14.03,5.41],[14.12,4.83],[14.26,4.26],[14.46,3.7],[14.71,3.17],[15.01,2.67],[15.36,2.19],[15.76,1.76],[16.19,1.36],[16.67,1.01],[17.17,0.71],[17.7,0.46],[18.26,0.26],[18.83,0.12],[19.41,0.03],[20,0],[79,0]]]
];
// @@FORMAS-END

function _forma() = is_undef(forma) ? "Retangular" : forma;
function _f() = let(i = [for (k = [0:len(FORMAS)-1]) if (FORMAS[k][0] == _forma()) k])
    FORMAS[len(i) > 0 ? i[0] : 0];

// Dimensões da placa: percentagem (50–200) da forma base, nos sliders largura_pct e
// altura_pct (omissão 100). Escala x e y do contorno; aba, furo e texto não se deformam,
// só mudam de posição.
function _esc(v) = is_num(v) ? max(0.5, min(2, v / 100)) : 1;
function _sx() = is_undef(largura_pct) ? 1 : _esc(largura_pct);
function _sy() = is_undef(altura_pct)  ? 1 : _esc(altura_pct);

function _cx() = _f()[1] * _sx();
function _cy() = _f()[2] * _sy();
function _topo() = _f()[3] * _sy();
function _furo_y() = _topo() + _f()[9];

module forma2d() { scale([_sx(), _sy()]) polygon(_f()[11]); }

module aba2d() {
    f = _f();
    w = f[6]; r = f[7];
    y0 = _topo() - f[8];
    h = _furo_y() + f[10] - y0;
    translate([_cx() - w/2, y0])
        hull() for (x = [r, w - r], y = [r, h - r])
            translate([x, y]) circle(r = r, $fn = 48);
}

module furo_cordao() {
    translate([_cx(), _furo_y(), -1]) cylinder(h = esp + 2, r = r_furo, $fn = 48);
}

module interior2d() { offset(delta = -borda_larg) forma2d(); }

module borda_relevo() {
    translate([0, 0, esp - _sob()])
        linear_extrude(borda_esp + _sob())
            difference() {
                forma2d();
                interior2d();
            }
}

// offset(delta = 0.01) funde contornos que se tocam nos cantos: sem ele, fontes de
// píxeis (Press Start 2P) geram uma malha não fechada ("The given mesh is not closed")
// e o OpenSCAD exporta a placa SEM texto.
module texto2d(t, esc) {
    scale(esc)
        offset(delta = 0.01)
            text(t, size = _fs(), font = _fonte(), halign = "center", valign = "center");
}

// Verso escavado, espelhado em X para ler correctamente ao virar a etiqueta
module corte_verso() {
    translate([_cx(), _cy(), -0.01])
        linear_extrude(prof_verso + 0.01)
            mirror([1, 0]) texto2d(_verso(), _esc_verso());
}

// Texto cortado pelo interior da borda: assim o texto e a borda nunca ocupam o mesmo
// volume (no 3MF seriam duas peças sobrepostas e o slicer escolheria uma cor ao acaso).
module frente() {
    translate([0, 0, esp - _sob()])
        linear_extrude(alt_texto + _sob())
            intersection() {
                interior2d();
                union() {
                    if (len(_linha2()) > 0) {
                        translate([_cx(), _cy() + _fs() * 0.55]) texto2d(_nome(), _esc_nome());
                        translate([_cx(), _cy() - _fs() * 0.55]) texto2d(_linha2(), _esc_linha2());
                    } else {
                        translate([_cx(), _cy()]) texto2d(_nome(), _esc_nome());
                    }
                }
            }
}

module base() {
    difference() {
        linear_extrude(esp) { forma2d(); aba2d(); }
        furo_cordao();
        if (len(_verso()) > 0) corte_verso();
    }
}

if (_modo() == "base") {
    base();
} else if (_modo() == "borda") {
    borda_relevo();
} else if (_modo() == "texto") {
    frente();
} else {
    color(_cor_base())  base();
    color(_cor_borda()) borda_relevo();
    color(_cor_texto()) frente();
}
